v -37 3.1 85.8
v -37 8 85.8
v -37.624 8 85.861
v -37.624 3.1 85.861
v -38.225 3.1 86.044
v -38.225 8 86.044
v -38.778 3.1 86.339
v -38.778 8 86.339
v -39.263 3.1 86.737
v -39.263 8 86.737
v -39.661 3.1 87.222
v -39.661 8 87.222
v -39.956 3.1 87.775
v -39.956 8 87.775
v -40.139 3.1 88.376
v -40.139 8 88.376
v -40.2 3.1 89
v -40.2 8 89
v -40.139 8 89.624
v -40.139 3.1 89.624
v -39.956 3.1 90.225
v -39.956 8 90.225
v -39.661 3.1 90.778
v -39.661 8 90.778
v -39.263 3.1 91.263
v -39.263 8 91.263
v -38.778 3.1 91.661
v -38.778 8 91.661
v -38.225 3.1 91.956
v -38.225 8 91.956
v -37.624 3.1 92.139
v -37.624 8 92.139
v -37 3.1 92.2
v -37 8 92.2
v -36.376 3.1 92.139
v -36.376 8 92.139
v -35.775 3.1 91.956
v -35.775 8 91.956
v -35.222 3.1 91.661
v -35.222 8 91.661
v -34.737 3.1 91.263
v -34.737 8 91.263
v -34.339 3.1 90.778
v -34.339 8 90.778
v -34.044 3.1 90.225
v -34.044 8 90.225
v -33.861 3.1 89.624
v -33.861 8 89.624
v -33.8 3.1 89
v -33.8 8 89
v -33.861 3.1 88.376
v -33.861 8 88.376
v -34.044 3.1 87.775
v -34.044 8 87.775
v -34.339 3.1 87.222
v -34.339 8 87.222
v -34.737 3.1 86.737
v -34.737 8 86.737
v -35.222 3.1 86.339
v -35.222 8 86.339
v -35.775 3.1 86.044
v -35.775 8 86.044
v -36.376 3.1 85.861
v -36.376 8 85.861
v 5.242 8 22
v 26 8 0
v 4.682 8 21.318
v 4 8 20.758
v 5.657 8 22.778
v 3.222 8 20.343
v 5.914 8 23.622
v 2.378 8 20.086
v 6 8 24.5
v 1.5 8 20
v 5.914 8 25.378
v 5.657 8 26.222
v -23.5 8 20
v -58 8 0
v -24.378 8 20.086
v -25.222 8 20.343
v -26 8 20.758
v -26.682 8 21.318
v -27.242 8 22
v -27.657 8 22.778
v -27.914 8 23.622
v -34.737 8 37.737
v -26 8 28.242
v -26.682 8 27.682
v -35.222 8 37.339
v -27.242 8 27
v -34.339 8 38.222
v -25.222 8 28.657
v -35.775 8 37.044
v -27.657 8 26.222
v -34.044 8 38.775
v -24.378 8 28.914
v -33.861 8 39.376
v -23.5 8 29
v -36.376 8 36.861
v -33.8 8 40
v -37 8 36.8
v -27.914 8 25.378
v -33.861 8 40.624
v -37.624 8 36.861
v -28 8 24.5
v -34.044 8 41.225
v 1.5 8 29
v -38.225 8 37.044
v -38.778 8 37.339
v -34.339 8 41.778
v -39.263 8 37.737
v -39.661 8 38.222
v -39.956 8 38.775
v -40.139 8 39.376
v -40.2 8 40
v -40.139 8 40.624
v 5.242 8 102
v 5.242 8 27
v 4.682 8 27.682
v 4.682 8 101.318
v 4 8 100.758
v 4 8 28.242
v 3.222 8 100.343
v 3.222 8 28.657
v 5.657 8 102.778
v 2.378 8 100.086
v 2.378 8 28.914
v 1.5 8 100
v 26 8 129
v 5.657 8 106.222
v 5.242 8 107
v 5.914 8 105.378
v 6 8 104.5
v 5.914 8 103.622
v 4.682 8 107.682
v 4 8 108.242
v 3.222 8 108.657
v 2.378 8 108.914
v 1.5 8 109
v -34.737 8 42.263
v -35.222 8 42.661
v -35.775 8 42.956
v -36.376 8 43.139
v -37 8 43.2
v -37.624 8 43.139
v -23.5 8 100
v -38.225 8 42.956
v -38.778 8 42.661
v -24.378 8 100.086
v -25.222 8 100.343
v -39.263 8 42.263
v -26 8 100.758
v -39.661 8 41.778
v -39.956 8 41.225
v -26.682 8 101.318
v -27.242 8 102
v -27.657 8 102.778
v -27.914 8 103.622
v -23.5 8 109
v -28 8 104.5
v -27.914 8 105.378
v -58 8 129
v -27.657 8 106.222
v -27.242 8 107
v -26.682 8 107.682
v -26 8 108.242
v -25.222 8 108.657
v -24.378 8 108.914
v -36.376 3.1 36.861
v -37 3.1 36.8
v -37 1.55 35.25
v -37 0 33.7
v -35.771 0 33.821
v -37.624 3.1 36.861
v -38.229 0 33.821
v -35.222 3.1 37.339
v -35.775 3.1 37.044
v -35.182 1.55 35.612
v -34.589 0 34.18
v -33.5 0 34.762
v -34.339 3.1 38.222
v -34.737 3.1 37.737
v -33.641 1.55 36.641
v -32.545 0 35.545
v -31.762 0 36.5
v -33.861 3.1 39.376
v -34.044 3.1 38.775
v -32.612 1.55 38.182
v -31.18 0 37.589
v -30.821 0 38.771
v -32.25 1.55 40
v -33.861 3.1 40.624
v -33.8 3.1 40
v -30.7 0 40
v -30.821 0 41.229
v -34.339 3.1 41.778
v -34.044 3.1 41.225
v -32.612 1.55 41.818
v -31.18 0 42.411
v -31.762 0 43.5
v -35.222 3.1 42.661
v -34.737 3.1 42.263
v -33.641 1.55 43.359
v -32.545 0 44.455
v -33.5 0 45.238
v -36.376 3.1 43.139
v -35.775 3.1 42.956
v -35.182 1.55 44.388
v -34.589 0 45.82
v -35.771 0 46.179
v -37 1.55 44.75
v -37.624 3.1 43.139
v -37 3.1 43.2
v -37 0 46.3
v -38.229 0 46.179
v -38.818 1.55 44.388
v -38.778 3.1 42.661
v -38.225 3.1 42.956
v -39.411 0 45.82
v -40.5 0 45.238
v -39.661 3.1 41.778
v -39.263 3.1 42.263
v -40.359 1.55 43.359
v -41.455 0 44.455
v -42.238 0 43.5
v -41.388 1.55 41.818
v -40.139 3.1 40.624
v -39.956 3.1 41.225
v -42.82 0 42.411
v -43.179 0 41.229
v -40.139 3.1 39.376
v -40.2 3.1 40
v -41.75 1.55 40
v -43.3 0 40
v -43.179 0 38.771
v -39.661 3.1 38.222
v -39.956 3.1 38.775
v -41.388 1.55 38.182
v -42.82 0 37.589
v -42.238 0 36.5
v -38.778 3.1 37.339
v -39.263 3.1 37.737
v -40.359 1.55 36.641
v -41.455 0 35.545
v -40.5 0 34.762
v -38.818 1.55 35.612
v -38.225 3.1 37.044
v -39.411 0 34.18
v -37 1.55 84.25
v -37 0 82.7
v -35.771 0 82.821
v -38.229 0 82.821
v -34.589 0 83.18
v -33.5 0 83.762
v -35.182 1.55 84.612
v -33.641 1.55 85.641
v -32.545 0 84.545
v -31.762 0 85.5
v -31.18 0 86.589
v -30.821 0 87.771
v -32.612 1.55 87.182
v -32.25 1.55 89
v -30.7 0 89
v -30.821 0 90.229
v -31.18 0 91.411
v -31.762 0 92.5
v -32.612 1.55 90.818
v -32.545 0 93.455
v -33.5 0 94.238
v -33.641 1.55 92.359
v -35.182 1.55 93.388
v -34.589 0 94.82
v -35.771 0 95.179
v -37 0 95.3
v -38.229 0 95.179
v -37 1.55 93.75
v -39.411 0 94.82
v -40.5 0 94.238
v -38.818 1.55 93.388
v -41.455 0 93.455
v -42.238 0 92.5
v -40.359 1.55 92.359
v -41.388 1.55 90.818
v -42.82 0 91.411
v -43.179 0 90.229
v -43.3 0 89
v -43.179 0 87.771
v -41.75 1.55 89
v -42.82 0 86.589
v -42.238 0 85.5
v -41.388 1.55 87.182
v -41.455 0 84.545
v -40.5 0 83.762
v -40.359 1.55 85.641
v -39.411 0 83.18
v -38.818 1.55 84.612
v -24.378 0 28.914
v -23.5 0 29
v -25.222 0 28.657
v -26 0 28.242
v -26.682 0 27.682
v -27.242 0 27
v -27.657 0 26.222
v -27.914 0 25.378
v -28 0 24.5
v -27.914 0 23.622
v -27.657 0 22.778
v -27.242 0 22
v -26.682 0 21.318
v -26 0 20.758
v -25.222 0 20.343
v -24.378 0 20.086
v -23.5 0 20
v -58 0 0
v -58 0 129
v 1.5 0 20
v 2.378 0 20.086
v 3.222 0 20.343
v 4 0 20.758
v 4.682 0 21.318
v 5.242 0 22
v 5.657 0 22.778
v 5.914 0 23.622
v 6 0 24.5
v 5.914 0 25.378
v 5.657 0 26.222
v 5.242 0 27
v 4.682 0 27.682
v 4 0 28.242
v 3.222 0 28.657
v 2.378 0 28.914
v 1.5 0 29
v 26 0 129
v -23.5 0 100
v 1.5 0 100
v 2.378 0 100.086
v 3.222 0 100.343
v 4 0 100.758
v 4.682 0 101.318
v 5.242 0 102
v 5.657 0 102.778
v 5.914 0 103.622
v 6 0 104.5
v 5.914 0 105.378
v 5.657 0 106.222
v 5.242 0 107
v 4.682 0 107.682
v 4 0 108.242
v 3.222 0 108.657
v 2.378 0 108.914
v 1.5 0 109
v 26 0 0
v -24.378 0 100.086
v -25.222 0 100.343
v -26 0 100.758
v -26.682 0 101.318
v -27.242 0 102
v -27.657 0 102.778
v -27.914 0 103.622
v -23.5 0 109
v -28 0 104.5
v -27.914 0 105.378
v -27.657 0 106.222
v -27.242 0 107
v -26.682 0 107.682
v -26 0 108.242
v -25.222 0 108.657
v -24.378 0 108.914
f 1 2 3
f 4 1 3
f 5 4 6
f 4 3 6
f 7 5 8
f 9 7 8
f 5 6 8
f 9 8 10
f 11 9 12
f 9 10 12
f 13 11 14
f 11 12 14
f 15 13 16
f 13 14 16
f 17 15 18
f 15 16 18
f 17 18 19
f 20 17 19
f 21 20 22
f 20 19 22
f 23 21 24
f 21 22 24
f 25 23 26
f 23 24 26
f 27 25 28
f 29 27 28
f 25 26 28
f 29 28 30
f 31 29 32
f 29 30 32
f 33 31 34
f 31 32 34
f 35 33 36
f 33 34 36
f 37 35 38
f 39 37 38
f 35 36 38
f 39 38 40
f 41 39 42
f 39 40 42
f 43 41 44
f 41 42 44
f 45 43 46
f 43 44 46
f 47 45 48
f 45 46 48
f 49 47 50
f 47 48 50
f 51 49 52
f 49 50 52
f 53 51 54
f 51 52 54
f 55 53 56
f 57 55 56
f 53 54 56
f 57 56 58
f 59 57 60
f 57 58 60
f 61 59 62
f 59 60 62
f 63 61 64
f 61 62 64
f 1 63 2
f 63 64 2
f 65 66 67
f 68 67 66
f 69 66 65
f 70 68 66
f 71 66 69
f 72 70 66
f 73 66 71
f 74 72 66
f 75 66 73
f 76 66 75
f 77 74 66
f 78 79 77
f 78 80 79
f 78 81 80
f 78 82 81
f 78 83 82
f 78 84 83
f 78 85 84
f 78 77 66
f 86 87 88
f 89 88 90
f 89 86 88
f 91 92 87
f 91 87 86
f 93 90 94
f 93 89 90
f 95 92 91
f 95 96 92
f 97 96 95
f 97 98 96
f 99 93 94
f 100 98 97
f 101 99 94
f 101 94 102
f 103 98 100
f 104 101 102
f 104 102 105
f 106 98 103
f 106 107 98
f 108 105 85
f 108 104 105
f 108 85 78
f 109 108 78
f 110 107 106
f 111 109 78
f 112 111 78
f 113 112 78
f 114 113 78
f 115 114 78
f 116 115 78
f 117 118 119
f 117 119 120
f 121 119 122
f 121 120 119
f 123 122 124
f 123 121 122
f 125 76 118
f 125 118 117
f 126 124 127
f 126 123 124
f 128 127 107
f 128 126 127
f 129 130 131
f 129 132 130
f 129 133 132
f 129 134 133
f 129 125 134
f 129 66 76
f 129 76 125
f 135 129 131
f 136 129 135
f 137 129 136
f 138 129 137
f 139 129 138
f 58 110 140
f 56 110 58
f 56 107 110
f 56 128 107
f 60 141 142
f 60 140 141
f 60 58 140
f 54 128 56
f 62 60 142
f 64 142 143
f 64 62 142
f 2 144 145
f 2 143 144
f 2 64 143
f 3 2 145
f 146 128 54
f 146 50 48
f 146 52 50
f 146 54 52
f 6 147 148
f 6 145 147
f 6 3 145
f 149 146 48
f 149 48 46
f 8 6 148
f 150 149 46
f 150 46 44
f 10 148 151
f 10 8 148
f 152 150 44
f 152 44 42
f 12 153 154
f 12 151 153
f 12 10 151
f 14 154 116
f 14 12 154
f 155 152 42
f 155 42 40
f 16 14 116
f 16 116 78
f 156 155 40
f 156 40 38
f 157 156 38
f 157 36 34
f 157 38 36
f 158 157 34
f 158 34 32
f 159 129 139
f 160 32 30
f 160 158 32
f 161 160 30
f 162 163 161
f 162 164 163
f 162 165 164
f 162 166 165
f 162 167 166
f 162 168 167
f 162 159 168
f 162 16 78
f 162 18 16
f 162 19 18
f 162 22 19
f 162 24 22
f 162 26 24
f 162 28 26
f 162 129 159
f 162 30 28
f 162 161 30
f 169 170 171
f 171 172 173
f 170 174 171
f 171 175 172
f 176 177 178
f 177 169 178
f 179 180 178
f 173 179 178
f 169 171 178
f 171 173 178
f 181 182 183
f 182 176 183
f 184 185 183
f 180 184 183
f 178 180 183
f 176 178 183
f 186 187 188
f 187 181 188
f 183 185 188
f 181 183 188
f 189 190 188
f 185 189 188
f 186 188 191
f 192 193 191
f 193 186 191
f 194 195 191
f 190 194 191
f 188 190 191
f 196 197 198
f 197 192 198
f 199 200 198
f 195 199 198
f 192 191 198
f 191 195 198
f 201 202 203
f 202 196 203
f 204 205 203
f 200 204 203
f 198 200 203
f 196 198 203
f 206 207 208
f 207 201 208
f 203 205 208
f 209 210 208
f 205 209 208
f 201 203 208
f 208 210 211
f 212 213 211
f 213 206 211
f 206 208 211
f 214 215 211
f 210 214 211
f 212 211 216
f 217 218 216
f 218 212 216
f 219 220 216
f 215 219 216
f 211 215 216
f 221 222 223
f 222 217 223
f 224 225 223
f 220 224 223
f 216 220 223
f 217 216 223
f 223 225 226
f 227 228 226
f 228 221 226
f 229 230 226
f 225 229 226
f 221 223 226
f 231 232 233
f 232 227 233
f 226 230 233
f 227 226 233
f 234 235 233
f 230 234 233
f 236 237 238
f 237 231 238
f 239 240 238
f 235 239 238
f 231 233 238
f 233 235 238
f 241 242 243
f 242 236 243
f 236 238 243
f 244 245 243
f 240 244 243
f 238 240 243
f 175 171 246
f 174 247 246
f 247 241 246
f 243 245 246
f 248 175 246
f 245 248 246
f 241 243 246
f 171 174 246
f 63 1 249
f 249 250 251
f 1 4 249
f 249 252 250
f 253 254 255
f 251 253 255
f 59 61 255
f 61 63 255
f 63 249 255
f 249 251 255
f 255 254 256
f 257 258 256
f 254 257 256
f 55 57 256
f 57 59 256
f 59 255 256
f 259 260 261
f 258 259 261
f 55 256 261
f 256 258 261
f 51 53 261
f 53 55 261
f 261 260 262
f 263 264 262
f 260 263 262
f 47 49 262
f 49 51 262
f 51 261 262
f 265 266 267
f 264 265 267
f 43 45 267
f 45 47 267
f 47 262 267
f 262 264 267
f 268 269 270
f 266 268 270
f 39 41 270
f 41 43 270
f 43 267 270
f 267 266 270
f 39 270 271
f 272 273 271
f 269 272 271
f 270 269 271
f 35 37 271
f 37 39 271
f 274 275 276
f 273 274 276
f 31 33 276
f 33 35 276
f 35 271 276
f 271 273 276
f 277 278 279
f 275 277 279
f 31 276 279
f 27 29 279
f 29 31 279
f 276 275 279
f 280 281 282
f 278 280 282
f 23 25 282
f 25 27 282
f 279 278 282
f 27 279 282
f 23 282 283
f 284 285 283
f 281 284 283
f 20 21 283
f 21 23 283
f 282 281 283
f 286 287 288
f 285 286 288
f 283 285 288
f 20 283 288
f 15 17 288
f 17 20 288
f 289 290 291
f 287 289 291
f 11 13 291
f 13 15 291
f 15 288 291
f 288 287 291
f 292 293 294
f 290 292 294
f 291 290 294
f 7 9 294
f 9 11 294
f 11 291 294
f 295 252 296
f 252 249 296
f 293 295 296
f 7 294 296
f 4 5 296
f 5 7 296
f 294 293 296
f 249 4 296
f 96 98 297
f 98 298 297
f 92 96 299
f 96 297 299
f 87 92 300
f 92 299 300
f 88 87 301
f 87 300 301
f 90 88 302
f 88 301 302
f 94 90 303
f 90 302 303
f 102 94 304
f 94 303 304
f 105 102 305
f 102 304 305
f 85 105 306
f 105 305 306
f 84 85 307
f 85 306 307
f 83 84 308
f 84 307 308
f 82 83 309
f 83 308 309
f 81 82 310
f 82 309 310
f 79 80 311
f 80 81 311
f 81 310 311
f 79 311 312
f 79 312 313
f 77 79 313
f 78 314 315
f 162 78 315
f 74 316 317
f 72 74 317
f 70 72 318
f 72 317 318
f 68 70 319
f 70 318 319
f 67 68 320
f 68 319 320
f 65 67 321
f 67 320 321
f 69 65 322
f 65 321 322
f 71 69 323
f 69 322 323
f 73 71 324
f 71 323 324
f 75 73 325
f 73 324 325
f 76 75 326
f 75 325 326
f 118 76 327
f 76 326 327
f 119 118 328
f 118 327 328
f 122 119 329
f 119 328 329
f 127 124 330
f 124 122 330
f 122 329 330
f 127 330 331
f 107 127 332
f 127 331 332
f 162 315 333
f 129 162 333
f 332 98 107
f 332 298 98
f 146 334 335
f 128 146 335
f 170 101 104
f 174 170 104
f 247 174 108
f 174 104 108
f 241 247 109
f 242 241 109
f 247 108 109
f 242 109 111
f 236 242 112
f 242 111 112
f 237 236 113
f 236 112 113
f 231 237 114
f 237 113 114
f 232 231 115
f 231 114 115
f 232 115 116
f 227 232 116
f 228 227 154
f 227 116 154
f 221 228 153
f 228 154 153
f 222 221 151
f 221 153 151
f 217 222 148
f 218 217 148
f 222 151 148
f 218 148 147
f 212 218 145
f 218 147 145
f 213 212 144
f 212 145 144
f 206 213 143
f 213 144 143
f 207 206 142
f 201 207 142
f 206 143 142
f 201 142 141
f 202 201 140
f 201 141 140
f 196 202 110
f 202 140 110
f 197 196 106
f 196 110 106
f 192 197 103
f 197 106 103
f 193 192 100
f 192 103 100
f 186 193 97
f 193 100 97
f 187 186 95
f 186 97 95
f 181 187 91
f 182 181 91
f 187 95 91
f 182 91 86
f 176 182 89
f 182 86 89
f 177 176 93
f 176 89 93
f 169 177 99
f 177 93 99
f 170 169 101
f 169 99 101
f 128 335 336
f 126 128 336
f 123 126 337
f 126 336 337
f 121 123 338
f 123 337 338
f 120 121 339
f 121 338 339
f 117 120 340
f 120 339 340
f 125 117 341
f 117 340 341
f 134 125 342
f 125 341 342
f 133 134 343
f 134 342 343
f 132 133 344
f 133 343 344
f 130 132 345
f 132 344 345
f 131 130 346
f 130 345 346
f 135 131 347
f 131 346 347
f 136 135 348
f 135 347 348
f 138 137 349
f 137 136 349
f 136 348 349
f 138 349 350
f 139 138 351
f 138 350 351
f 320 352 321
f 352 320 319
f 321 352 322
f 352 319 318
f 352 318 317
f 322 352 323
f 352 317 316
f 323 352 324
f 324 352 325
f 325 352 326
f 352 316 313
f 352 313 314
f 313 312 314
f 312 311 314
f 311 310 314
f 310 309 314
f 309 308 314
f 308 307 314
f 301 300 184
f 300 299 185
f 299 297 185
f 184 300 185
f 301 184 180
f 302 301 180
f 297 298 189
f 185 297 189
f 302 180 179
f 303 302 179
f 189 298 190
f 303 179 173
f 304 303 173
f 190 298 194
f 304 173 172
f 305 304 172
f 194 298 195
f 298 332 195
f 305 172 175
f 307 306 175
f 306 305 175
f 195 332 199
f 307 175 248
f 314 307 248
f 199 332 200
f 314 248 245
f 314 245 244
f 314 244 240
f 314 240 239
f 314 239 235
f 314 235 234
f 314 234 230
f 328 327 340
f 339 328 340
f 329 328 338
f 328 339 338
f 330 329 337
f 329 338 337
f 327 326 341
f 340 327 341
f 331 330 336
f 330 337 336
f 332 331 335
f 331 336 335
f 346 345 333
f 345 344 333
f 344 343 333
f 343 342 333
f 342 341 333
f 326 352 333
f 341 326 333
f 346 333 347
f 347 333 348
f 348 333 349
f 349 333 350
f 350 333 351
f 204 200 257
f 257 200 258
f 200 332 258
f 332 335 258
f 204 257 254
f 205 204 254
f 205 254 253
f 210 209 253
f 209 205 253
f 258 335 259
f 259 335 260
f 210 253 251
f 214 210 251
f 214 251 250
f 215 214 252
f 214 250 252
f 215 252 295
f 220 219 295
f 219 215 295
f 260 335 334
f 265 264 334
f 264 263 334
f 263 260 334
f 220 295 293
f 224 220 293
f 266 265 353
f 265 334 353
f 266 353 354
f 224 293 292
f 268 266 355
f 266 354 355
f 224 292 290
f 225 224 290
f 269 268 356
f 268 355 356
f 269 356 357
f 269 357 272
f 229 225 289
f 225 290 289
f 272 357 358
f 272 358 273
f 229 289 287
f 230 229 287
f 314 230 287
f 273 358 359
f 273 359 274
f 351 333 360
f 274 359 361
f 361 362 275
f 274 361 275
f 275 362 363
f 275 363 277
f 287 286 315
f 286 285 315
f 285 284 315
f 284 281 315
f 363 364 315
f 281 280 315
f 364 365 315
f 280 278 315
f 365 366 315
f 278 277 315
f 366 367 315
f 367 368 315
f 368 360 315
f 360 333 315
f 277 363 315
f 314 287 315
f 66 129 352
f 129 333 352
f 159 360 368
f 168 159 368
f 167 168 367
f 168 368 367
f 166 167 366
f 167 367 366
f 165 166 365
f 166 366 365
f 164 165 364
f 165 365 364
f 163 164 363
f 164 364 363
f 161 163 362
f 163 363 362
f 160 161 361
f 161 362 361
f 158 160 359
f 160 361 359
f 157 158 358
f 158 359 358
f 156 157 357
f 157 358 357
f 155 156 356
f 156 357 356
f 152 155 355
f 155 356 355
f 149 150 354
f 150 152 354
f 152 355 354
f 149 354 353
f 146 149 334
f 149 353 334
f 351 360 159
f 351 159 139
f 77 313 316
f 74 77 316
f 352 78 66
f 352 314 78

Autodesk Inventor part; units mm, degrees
ref_plane "YZ Plane" through (0, 0, 0) normal (1, 0, 0) x (0, 1, 0)
ref_plane "XZ Plane" through (0, 0, 0) normal (0, 1, 0) x (-1, 0, 0)
ref_plane "XY Plane" through (0, 0, 0) normal (0, 0, 1) x (1, 0, 0)
sketch "Sketch1" plane through (0, 0, 0) normal (0, 1, 0) x (-1, 0, 0)
  arc A0 (23.5, 20) -> (23.5, 29) centre (23.5, 24.5) ccw
  line L0 (23.5, 20) -> (-1.5, 20)
  line L1 (23.5, 29) -> (-1.5, 29)
  arc A1 (-1.5, 29) -> (-1.5, 20) centre (-1.5, 24.5) ccw
  arc A2 (23.5, 100) -> (23.5, 109) centre (23.5, 104.5) ccw
  line L2 (23.5, 100) -> (-1.5, 100)
  line L3 (23.5, 109) -> (-1.5, 109)
  arc A3 (-1.5, 109) -> (-1.5, 100) centre (-1.5, 104.5) ccw
  line L4 (74, 129) -> (0, 129)
  line L5 (0, 129) -> (74, 129)
  line L6 (74, 129) -> (74, 0)
  line L7 (74, 0) -> (0, 0)
  line L8 (0, 0) -> (0, 129)
  line L9 (0, 129) -> (-26, 129)
  line L10 (-26, 129) -> (-26, 0)
  line L11 (-26, 0) -> (0, 0)
  line L12 (0, 0) -> (0, 129)
  line L13 (74, 0) -> (58, 0)
  line L14 (58, 0) -> (58, 129)
  line L15 (58, 129) -> (74, 129)
  line L16 (74, 129) -> (74, 0)
  point P0 (0, 0)
  point P1 (23.5, 104.5)
  point P2 (0, 109)
  point P3 (0, 20)
  point P4 (0, 29)
  point P5 (0, 100)
  dimension "d98" = 74
  dimension "d106" = 26
  dimension "d118" = 16
extrude "Extrusion1" add sketch "Sketch1" along normal blind 8 contours A0 L1 L8 L2 A2 L3 L4 L14 L7 L0 | L8 L11 L10 L9 L3 A3 L2 L1 A1 L0
sketch "Sketch4" plane through (0, 0, 0) normal (0, -1, 0) x (1, 0, 0)
  line L0 (-74, 0) -> (-74, 129) projected
  line L1 (-74, 129) -> (0, 0)
  line L2 (0, 100) -> (0, 0) projected
  line L3 (0, 129) -> (-74, 0)
  line L4 (-37, 0) -> (-37, 129)
  line L5 (-58, 129) -> (26, 129) projected
  line L6 (-37, 129) -> (-37, 89)
  line L7 (-37, 129) -> (3, 129) construction
  line L8 (-37, 89) -> (-37, 40)
  line L9 (-37, 40) -> (-37, 0)
  point P0 (-37, 64.5)
  dimension "d119" = 40
  dimension "d120" = 90
  dimension "d121" = 49
  dimension "d122" = 40
hole "Hole1" at (-37, 0, 89) at (-37, 0, 40) direction (0, 1, 0) diameter 6.4 depth 20 countersink diameter 12.6 countersink angle 90 clearance for "Countersunk Flat Head Screw ISO 2009/7046" size "M6" standard "ISO"
properties part number "Halterung_Führungsschiene_Version2"
